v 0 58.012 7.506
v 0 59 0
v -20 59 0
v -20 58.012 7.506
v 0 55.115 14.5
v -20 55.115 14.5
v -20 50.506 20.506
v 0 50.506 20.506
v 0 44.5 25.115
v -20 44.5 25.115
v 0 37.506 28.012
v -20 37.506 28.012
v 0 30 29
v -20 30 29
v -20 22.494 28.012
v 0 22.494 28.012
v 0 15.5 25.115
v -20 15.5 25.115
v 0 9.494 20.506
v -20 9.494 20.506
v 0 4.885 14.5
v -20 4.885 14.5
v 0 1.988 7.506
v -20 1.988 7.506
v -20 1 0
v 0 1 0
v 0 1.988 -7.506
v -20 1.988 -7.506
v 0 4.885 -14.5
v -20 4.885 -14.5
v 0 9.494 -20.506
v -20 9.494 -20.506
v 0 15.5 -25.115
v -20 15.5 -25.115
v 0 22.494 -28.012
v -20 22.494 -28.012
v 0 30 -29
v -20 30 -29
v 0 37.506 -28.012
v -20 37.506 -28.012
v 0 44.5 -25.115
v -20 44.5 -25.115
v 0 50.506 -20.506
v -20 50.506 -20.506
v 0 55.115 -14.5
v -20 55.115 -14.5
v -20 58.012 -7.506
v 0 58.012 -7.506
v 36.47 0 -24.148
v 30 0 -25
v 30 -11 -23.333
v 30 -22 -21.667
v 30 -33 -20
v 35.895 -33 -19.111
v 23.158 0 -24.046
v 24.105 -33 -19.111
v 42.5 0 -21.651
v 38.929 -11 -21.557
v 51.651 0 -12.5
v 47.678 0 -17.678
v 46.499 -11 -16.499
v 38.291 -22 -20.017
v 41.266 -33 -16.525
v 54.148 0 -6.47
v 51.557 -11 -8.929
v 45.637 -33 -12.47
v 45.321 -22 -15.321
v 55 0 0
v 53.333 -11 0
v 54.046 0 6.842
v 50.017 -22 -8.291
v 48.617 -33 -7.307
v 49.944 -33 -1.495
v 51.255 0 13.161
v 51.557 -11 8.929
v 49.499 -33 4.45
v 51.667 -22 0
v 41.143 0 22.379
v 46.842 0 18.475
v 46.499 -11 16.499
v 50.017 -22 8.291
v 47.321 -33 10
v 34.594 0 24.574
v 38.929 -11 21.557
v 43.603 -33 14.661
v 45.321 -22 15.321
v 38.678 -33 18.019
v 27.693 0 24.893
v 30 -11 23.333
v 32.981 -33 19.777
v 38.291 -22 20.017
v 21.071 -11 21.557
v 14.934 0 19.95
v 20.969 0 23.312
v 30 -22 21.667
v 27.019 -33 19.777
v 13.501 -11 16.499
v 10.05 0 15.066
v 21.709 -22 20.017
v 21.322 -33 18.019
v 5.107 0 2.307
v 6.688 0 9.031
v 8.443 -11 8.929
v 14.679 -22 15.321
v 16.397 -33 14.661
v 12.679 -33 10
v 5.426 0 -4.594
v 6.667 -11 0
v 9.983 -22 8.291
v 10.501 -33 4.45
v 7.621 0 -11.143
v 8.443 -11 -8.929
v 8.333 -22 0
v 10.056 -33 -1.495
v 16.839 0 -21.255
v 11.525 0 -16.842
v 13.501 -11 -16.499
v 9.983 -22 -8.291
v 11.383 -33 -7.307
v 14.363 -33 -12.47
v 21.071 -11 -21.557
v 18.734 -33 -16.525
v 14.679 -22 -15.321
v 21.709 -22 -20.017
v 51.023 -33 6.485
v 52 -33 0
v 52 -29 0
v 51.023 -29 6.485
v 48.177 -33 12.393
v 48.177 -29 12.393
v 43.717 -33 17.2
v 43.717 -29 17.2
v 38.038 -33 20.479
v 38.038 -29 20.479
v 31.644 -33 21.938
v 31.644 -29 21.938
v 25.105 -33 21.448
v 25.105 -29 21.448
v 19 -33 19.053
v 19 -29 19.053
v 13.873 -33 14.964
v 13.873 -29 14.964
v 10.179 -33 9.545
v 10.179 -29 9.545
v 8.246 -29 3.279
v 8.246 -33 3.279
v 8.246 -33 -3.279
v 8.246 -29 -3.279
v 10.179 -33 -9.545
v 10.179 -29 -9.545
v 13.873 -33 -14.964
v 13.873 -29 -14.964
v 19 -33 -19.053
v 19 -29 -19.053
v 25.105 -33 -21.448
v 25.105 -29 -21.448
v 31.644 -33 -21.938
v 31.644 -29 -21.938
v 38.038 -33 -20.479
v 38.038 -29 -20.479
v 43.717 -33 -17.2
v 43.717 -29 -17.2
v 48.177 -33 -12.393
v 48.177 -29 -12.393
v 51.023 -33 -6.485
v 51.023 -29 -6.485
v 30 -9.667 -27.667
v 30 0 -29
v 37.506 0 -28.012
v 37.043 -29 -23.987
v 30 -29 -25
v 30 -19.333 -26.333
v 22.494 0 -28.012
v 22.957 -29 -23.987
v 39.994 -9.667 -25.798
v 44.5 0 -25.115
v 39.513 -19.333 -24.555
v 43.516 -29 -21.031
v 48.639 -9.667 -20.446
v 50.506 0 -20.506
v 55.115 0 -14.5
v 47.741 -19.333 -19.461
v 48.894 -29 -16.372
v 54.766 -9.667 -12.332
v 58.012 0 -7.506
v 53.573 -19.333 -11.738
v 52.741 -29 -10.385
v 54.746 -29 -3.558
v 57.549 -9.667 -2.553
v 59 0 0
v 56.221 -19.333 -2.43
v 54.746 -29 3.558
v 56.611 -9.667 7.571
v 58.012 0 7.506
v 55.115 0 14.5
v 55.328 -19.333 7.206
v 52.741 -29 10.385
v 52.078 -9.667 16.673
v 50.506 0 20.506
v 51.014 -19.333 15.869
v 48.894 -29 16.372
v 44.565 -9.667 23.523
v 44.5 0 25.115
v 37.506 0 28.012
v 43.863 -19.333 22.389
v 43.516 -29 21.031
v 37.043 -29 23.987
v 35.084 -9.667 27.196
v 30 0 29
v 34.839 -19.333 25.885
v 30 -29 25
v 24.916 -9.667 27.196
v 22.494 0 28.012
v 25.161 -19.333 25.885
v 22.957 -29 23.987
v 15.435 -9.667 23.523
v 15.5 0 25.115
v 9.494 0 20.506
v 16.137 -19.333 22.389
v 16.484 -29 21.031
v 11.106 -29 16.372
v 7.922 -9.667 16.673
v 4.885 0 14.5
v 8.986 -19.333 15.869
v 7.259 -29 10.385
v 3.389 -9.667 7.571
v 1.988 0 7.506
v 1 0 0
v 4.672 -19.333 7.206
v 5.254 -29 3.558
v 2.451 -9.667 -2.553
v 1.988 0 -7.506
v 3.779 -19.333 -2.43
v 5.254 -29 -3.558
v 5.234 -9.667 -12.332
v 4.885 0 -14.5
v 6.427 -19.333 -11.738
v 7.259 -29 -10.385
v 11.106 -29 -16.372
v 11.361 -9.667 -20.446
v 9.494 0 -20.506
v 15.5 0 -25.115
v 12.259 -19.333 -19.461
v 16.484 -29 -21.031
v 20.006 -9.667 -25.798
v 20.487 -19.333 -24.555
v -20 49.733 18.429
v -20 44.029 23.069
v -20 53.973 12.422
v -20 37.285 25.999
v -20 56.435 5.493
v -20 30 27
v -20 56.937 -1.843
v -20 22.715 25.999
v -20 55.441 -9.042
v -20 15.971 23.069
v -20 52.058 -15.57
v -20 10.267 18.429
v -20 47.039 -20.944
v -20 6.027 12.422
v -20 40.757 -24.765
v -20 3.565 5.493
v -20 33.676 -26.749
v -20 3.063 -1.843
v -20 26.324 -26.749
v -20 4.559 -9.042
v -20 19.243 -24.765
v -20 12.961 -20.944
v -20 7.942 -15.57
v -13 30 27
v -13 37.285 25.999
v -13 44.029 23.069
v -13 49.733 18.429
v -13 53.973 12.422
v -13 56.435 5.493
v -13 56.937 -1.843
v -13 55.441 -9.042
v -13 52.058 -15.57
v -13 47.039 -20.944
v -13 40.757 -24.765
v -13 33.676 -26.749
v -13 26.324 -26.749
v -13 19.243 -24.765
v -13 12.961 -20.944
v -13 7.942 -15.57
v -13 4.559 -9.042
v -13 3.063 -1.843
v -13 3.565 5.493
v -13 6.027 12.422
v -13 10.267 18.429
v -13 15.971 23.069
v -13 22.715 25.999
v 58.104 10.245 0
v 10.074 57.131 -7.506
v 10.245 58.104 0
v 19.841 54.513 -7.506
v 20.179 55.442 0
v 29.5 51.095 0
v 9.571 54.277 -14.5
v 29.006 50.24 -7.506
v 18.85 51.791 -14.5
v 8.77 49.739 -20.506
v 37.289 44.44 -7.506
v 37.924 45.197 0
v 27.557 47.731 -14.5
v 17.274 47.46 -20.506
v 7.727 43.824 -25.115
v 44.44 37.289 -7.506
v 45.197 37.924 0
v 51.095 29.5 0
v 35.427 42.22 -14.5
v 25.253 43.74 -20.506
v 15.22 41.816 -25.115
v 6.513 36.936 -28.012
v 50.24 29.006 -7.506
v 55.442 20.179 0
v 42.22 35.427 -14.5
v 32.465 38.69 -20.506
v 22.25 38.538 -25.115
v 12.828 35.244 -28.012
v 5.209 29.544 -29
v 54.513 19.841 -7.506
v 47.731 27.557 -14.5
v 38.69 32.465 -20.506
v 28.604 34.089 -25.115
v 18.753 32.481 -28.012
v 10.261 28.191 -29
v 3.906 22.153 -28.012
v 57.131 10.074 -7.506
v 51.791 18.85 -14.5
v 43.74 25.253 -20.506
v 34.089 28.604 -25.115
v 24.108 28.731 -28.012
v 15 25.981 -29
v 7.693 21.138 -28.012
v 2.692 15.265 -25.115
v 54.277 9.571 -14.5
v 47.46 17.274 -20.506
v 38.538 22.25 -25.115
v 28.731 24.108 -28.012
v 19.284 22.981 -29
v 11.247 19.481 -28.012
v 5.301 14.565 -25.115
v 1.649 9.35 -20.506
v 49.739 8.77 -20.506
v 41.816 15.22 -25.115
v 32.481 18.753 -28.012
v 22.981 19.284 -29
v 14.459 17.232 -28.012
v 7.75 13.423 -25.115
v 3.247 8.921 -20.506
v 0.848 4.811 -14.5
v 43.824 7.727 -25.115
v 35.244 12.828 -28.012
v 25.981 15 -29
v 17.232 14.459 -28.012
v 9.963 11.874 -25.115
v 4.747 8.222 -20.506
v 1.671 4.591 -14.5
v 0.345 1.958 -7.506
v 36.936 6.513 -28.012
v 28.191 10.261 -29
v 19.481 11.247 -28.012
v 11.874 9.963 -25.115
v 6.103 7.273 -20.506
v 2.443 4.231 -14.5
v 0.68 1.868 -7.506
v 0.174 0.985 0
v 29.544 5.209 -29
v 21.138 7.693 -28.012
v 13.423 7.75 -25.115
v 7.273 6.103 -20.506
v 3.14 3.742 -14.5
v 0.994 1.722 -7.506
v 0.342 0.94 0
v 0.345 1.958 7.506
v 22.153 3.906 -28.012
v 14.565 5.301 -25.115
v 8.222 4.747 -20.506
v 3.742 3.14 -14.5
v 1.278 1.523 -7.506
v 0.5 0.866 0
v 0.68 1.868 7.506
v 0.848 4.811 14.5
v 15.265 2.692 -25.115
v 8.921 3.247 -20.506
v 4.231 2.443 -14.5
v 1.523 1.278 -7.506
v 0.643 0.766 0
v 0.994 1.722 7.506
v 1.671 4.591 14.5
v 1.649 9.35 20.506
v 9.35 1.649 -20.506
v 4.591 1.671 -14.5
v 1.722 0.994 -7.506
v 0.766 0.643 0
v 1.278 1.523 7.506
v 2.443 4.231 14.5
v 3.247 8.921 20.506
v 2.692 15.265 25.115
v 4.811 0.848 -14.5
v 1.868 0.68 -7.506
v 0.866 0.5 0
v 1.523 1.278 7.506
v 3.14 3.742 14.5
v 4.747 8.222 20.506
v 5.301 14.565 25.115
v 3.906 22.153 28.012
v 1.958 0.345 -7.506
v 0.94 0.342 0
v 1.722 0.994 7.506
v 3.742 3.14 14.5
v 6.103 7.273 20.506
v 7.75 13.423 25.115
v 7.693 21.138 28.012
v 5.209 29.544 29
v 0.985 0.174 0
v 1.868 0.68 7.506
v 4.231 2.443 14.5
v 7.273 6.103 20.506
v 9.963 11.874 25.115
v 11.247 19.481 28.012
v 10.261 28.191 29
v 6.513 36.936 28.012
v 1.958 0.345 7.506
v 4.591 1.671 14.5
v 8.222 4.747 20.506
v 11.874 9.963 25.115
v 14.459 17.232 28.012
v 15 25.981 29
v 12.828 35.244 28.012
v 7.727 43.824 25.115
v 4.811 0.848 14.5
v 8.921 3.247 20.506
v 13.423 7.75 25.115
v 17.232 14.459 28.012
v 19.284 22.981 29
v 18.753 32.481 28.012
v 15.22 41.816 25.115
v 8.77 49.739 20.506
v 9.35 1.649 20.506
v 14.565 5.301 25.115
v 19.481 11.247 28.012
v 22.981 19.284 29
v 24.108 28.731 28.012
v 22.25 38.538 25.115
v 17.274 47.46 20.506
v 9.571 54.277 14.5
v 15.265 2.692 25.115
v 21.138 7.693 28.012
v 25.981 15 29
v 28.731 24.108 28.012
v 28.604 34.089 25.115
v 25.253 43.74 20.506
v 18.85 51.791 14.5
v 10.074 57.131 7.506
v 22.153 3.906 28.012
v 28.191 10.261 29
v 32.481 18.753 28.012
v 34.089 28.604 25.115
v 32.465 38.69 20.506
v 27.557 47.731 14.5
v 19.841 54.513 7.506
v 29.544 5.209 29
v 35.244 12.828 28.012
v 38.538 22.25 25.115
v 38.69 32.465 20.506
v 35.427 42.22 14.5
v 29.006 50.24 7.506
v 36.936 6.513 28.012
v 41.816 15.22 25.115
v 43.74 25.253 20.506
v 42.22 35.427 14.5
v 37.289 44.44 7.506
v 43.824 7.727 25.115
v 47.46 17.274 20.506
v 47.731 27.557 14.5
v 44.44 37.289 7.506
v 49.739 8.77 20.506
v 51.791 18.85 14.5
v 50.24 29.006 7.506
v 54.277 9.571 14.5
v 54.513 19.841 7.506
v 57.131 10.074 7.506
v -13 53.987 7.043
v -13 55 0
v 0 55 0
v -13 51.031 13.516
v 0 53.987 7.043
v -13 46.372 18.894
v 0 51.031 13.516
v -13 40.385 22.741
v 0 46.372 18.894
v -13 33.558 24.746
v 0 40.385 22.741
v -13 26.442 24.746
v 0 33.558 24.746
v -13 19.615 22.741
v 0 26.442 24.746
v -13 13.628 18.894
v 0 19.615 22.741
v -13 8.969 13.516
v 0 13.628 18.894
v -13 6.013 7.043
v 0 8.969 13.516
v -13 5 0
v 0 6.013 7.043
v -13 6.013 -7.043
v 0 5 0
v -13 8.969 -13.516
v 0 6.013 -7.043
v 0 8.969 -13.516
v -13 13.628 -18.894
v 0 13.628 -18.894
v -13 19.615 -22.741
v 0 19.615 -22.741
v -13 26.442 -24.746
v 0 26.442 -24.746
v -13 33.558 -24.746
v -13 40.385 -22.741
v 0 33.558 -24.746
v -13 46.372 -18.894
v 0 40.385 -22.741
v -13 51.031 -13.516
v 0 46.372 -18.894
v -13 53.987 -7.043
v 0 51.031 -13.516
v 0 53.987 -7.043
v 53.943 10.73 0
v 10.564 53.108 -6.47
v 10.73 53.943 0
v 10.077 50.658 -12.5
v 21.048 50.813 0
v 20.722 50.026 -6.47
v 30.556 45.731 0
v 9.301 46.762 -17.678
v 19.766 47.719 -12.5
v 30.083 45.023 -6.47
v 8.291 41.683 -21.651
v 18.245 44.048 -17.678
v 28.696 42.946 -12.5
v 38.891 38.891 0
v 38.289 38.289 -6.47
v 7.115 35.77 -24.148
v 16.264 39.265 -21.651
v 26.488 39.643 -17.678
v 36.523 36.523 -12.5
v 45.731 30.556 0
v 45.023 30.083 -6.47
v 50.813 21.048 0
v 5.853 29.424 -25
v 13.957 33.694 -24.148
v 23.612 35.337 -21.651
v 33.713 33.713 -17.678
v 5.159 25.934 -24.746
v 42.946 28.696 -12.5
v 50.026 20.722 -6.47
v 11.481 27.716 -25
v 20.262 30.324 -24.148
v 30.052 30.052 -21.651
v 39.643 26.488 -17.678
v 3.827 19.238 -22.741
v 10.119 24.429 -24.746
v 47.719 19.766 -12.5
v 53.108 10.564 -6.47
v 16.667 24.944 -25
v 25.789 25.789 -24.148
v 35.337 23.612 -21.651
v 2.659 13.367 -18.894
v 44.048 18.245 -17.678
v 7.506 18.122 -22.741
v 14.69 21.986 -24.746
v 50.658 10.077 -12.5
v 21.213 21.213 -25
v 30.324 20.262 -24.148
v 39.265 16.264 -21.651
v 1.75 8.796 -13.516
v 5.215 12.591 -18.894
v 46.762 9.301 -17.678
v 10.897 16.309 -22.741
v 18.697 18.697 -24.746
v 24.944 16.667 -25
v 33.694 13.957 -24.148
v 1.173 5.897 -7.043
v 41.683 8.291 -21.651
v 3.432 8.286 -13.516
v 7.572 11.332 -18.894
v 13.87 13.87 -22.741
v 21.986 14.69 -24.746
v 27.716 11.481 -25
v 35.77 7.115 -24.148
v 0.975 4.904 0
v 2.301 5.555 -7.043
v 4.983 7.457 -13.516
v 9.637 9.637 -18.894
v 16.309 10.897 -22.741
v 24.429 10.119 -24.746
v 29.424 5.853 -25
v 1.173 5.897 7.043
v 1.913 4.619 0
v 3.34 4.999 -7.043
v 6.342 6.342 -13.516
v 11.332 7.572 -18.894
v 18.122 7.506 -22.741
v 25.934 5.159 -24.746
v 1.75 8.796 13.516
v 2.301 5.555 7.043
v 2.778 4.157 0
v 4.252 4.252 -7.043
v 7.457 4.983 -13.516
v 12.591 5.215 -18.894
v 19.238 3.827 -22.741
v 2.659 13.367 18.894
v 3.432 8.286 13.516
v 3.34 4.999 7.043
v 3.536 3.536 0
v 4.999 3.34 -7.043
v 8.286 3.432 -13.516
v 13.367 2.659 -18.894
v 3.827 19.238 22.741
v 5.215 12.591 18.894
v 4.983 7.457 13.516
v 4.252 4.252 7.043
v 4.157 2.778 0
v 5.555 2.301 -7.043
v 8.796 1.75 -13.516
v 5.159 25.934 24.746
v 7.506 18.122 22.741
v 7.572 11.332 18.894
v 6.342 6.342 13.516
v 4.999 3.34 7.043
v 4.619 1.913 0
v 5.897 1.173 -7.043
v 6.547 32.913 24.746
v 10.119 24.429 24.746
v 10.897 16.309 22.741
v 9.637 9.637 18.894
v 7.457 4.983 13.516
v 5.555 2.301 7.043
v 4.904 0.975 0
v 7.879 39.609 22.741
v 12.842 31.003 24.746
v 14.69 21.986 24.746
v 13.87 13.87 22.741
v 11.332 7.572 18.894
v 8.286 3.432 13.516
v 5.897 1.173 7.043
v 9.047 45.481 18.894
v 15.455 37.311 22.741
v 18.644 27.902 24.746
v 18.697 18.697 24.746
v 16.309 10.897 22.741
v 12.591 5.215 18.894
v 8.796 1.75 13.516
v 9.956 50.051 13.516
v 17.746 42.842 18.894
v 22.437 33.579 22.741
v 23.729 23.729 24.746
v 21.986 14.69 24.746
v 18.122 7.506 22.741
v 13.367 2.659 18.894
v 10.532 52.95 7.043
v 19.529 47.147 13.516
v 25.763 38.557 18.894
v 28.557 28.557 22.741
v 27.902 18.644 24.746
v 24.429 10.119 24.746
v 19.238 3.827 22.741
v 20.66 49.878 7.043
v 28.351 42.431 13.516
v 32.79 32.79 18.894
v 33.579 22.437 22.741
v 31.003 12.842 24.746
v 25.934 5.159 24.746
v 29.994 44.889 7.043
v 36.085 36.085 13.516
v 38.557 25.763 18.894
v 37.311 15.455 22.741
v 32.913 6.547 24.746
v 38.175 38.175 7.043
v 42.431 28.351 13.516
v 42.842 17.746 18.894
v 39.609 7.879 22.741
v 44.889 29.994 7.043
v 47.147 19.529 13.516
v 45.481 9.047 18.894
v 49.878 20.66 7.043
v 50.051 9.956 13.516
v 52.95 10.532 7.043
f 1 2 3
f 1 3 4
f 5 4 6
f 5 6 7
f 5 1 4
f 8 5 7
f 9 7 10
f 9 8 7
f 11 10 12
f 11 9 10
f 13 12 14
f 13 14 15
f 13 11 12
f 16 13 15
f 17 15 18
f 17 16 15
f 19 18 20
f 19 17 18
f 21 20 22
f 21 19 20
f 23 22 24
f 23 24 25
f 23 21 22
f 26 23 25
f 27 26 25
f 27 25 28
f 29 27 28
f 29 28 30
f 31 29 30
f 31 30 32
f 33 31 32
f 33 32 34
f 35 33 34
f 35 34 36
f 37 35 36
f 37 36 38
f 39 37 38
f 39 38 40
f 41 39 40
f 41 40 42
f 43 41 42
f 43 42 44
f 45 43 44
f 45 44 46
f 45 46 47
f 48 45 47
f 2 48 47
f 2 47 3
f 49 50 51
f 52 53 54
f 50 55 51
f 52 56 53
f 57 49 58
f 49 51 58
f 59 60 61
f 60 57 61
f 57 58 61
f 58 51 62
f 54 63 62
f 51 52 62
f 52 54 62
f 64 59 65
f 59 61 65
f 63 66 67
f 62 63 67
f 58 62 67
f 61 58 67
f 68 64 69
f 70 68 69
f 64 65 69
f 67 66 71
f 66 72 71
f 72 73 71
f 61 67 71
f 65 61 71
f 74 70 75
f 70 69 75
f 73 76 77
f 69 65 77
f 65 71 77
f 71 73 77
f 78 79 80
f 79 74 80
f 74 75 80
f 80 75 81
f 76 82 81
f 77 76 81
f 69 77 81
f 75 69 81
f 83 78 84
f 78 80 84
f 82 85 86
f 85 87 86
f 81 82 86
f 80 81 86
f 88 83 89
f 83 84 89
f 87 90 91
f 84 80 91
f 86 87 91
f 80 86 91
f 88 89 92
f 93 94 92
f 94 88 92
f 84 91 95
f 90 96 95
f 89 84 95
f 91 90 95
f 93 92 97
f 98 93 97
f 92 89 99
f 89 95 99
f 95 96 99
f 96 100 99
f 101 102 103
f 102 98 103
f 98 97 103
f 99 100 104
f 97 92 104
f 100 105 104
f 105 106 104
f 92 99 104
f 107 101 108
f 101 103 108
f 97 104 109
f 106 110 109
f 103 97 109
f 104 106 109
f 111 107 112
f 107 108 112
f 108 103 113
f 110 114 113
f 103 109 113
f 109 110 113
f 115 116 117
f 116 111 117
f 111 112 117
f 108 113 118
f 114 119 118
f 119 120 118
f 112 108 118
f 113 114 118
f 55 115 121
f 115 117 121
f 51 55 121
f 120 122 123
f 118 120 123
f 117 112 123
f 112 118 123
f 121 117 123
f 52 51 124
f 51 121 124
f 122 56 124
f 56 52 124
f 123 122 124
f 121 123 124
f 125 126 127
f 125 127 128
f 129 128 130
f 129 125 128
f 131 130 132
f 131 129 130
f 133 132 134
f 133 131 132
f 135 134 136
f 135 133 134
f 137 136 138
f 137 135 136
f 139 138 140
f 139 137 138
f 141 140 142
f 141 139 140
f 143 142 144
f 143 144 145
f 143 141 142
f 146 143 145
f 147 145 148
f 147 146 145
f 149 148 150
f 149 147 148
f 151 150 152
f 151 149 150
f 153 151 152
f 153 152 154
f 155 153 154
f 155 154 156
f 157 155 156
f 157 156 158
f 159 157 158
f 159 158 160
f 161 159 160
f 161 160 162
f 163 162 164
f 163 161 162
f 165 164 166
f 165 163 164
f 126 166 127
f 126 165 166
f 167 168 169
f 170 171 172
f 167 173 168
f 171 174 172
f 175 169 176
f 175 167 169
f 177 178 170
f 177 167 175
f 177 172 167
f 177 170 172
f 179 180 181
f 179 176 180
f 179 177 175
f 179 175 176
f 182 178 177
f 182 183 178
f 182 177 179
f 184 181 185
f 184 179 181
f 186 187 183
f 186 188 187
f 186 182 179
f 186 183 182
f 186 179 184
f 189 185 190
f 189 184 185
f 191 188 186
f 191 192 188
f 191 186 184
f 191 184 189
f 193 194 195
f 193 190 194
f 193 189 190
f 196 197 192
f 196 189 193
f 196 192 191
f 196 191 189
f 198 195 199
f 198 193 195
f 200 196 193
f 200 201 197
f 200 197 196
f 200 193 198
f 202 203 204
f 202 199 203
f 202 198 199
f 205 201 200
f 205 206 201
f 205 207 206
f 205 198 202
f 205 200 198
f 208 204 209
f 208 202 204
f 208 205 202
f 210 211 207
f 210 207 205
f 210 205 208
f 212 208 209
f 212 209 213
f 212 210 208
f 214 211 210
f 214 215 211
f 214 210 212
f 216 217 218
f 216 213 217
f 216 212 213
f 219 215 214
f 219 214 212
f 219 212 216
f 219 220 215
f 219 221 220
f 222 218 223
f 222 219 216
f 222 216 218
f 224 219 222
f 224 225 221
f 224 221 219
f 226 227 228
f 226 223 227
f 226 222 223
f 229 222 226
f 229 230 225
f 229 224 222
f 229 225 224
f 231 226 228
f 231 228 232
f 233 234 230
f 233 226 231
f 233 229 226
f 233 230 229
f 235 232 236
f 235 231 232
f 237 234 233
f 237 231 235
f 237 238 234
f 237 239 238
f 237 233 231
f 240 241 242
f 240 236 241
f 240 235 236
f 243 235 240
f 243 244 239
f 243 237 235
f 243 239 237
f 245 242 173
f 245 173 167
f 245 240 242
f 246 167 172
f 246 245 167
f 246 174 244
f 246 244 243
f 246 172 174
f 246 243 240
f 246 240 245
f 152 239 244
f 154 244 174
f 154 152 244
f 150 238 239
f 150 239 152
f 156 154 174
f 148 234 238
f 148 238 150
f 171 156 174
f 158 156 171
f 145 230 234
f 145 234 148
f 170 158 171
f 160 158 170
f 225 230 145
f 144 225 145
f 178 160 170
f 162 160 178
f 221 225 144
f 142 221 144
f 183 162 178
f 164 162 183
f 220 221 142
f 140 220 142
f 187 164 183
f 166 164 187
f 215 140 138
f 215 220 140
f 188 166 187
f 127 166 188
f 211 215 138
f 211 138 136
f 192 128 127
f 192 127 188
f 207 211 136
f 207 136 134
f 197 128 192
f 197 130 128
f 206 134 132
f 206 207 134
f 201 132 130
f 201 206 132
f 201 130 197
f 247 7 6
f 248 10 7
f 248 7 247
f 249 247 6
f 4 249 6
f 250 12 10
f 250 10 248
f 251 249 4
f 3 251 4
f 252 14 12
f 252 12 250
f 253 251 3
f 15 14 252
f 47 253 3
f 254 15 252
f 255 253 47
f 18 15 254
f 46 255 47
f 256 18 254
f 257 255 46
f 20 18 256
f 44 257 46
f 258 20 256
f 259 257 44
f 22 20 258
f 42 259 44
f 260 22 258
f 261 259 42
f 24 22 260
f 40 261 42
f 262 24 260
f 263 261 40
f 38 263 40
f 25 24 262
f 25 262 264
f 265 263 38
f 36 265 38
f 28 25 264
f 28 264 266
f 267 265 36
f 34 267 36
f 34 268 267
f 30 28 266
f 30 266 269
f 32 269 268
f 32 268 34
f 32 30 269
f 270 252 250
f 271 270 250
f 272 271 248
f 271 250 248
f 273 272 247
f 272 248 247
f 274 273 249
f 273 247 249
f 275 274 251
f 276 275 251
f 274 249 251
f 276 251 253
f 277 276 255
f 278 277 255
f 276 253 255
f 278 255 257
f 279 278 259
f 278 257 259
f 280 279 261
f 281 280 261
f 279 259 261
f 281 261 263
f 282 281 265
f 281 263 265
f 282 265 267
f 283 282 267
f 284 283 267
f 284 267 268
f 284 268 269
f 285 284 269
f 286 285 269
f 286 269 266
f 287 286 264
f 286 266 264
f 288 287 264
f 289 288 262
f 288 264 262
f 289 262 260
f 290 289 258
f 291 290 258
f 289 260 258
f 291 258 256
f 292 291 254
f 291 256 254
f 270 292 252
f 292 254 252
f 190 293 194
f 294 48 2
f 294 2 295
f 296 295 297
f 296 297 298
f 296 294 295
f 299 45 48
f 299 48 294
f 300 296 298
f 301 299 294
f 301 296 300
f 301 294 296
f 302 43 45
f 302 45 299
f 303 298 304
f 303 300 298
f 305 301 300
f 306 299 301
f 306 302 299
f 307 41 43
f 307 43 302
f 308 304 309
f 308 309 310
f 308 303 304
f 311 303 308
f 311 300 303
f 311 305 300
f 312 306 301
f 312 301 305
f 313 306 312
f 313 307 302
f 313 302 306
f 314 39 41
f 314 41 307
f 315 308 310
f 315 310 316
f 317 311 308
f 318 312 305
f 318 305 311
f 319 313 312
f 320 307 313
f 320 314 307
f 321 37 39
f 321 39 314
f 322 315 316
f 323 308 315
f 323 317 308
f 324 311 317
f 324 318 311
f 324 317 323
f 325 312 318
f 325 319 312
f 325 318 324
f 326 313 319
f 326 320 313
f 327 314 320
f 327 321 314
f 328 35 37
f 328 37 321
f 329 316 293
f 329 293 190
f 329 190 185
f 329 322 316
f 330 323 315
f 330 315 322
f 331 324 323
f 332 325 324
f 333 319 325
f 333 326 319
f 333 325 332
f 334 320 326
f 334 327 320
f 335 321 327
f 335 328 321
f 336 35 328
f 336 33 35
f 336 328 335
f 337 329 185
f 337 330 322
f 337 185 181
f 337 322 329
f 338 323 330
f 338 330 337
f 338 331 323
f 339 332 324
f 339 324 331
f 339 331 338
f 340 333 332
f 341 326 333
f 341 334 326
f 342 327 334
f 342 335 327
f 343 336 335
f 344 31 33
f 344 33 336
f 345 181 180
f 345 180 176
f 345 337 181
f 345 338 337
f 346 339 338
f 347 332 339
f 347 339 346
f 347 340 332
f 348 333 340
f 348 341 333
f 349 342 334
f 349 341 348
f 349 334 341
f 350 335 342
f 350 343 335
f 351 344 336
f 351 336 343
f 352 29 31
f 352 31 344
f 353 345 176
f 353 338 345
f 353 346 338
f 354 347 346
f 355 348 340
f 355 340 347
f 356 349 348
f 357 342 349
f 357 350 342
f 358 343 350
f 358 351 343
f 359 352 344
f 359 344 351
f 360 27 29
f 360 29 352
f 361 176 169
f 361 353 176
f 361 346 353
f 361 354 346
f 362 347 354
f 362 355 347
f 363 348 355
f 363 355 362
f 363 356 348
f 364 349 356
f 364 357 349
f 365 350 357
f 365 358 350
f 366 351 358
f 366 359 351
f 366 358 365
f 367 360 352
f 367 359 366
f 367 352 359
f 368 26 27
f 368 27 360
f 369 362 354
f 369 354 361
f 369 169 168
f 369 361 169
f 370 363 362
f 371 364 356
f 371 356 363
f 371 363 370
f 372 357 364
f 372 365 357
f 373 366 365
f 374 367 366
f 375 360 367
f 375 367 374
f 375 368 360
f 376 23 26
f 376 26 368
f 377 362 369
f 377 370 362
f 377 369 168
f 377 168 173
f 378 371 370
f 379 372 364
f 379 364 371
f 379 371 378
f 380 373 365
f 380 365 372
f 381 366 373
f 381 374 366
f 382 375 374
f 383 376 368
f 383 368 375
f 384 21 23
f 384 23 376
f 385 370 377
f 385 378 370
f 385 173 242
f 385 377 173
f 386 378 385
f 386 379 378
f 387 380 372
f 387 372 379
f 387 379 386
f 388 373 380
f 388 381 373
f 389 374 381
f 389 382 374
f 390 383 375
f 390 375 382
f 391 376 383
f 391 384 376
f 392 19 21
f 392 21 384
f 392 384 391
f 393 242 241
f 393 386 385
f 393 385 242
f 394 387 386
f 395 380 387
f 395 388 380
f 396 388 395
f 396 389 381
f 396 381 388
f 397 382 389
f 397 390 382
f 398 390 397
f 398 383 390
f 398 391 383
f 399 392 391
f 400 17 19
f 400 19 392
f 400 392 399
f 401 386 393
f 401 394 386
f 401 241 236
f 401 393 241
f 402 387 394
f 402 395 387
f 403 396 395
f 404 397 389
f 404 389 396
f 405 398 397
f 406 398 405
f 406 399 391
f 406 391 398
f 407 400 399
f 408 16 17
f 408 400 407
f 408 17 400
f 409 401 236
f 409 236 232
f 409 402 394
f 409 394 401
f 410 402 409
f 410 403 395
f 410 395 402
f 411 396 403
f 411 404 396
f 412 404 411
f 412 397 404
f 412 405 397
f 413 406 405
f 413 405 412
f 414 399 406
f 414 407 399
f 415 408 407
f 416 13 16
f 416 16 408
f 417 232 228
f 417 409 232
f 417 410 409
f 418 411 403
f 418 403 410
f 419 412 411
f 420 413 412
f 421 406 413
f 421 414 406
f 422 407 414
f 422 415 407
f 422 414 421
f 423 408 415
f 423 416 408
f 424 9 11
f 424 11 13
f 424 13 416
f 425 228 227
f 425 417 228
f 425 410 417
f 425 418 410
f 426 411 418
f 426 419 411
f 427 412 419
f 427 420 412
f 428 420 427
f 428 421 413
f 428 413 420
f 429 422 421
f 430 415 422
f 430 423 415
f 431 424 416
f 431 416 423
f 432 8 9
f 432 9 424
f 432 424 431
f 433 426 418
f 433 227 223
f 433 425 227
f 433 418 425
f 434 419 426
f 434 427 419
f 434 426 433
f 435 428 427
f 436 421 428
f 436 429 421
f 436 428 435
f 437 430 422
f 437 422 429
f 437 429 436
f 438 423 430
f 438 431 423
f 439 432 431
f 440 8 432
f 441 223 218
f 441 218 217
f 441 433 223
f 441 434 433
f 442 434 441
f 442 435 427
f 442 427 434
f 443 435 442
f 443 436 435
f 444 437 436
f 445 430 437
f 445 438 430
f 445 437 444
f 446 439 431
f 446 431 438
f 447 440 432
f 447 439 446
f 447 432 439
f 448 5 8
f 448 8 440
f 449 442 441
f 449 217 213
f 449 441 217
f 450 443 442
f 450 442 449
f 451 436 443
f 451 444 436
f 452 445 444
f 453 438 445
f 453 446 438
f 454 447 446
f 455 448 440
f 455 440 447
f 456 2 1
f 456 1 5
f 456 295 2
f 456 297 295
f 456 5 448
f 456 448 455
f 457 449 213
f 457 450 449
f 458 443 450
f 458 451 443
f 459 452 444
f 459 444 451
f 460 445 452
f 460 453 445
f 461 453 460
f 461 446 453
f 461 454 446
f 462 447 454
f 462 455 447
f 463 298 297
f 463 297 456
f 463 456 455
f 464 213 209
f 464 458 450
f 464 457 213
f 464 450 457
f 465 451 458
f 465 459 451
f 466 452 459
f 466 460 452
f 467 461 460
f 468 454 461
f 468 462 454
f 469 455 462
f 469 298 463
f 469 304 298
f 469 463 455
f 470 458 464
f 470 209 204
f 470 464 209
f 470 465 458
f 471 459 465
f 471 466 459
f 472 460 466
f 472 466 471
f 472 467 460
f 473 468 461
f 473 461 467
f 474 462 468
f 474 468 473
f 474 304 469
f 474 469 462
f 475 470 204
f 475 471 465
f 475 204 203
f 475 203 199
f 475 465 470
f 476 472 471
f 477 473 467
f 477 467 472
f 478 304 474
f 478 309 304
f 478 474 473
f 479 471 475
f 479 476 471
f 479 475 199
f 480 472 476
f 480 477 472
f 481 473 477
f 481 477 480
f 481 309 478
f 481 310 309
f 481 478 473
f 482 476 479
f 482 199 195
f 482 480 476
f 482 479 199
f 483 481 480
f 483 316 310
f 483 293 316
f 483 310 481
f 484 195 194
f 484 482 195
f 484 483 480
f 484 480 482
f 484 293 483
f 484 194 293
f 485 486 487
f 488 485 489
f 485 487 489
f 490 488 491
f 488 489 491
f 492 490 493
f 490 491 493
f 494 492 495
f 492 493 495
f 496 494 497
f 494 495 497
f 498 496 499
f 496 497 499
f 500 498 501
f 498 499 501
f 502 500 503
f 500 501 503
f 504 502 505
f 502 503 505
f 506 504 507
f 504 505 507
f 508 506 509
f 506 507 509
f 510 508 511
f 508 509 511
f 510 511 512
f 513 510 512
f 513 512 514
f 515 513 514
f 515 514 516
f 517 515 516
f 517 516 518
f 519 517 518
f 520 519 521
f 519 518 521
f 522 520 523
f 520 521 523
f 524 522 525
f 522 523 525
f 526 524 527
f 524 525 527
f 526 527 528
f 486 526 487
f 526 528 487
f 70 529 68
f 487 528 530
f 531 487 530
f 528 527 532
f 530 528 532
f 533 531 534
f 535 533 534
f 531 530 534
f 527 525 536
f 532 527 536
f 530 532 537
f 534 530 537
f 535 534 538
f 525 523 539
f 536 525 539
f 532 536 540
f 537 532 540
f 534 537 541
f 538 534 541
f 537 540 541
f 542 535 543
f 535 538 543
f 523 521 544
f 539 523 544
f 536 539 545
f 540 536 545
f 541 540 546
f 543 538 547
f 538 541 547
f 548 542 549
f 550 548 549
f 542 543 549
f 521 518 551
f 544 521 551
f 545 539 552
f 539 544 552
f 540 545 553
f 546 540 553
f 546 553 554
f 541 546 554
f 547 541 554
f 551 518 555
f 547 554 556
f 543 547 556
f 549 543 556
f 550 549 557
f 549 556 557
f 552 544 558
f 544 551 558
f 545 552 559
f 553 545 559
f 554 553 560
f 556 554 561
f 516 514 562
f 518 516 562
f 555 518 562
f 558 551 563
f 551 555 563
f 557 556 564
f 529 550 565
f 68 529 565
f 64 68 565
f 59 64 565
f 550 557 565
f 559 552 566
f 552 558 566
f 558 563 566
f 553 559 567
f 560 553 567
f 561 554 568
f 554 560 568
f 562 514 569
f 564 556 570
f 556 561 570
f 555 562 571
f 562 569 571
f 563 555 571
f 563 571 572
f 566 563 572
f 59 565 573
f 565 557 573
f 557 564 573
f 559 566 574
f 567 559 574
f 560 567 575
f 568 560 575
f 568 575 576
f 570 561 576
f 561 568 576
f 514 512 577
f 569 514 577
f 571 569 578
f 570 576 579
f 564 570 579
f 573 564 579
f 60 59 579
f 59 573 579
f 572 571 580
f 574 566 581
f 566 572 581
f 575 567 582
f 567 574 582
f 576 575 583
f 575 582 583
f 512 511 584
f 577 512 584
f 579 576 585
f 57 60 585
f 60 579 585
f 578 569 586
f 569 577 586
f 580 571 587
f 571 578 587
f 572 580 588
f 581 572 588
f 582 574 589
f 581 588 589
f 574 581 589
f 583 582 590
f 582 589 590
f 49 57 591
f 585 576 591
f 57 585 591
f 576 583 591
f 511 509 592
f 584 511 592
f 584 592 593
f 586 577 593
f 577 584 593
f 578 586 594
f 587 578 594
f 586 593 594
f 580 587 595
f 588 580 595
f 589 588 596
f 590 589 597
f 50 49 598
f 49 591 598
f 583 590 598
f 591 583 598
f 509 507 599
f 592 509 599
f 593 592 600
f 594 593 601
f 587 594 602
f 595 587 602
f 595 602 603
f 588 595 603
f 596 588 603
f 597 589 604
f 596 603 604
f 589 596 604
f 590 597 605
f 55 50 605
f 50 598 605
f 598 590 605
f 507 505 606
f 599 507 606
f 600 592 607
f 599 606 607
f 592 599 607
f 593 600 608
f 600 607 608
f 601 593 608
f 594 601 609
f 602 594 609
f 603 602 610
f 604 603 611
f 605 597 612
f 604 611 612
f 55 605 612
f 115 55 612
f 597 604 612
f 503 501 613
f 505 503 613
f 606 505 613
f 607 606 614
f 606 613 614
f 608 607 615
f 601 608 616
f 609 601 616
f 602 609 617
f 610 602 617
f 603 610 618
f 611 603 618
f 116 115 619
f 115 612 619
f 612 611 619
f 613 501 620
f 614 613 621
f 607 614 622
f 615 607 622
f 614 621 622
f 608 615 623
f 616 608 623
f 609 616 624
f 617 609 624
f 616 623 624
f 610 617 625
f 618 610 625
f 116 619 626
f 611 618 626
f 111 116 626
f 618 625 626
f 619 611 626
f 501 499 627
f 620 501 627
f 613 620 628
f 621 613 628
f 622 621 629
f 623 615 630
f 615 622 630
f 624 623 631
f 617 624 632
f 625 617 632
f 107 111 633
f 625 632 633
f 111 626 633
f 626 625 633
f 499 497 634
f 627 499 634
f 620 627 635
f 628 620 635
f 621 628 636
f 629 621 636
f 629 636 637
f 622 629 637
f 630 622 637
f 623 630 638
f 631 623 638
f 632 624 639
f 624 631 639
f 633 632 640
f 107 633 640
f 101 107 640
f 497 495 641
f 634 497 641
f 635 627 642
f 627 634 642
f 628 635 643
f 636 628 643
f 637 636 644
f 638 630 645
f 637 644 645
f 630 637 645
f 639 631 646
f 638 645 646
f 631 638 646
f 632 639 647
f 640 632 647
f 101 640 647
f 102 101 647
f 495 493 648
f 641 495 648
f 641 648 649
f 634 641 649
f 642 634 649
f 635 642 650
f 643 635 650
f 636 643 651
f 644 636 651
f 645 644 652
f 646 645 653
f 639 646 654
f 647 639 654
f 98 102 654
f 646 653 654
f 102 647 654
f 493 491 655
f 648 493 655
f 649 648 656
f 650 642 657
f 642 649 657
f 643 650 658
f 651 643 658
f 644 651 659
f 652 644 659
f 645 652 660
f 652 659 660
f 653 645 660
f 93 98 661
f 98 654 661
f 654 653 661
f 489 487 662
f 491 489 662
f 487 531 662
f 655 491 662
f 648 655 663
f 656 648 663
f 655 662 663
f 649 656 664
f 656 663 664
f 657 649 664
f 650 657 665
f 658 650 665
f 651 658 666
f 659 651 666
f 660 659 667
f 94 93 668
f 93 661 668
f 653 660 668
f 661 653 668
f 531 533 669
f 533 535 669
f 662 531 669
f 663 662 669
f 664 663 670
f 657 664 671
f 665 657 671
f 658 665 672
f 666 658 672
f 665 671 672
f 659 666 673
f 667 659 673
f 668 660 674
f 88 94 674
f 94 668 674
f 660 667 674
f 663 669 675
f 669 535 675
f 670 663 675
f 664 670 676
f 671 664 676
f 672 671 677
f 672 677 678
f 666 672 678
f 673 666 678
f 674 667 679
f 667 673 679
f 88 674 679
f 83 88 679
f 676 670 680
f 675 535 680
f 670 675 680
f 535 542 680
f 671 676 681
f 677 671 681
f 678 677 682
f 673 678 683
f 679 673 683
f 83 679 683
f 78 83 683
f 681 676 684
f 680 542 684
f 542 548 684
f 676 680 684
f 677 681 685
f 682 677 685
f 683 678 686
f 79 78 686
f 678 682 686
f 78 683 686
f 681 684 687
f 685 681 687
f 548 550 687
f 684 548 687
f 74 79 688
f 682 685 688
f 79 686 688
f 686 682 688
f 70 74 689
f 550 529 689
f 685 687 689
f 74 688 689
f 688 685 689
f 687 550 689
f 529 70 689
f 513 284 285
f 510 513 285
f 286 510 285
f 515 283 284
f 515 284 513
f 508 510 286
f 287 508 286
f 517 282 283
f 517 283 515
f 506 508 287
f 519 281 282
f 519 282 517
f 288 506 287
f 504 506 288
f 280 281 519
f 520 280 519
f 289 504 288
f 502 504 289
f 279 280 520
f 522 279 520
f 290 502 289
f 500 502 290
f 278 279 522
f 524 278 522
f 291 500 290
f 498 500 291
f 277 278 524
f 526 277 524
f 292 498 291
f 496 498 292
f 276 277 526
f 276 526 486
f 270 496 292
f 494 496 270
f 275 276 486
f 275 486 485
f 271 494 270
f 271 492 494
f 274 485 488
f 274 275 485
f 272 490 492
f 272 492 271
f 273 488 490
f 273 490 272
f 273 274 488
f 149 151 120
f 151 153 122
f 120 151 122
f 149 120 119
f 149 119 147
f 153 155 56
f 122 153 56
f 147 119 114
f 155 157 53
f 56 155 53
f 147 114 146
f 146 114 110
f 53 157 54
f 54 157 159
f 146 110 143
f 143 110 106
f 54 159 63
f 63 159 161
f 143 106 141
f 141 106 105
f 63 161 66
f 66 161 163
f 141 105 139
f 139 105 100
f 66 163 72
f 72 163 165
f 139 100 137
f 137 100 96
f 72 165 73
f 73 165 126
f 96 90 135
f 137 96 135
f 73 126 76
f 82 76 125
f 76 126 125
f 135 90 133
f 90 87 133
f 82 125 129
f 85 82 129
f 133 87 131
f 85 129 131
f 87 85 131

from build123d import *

# Parameters (mm, degrees)
SKETCH2_R          = 29
SKETCH2_R_2        = 25
SKETCH3_R          = 27
SKETCH3_R_2        = 25
CUT_EXTRUDE1_DEPTH = 7
SKETCH8_R          = 29
SKETCH8_R_2        = 22
CUT_EXTRUDE3_DEPTH = 4


with BuildPart() as part:
    # Sweep1: sweep along a path in Sketch1
    with BuildLine(Plane.XY) as sweep1_path:
        Line((-20, 30), (0, 30))
        ThreePointArc((0, 30), (21.213203436, 21.213203436), (30, 0))
        Line((30, 0), (30, -33))
    # Sketch2 → Sweep1 (sweep)
    with BuildSketch(Plane(origin=(0, -33, 0), x_dir=(1, 0, 0), z_dir=(0, 1, 0))):
        with Locations((30, 0)):
            Circle(SKETCH2_R)
        with Locations((30, 0)):
            Circle(SKETCH2_R_2, mode=Mode.SUBTRACT)
    sweep(path=sweep1_path.line)

    # Sketch3 → Cut-Extrude1 (cut)
    with BuildSketch(Plane.ZY.offset(20)):
        with Locations((0, 30)):
            Circle(SKETCH3_R)
        with Locations((0, 30)):
            Circle(SKETCH3_R_2, mode=Mode.SUBTRACT)
    extrude(amount=-CUT_EXTRUDE1_DEPTH, mode=Mode.SUBTRACT)

    # Sketch7 → Revolve2 (revolve)
    with BuildSketch(Plane(origin=(30, 0, 0), x_dir=(0, 0, -1), z_dir=(1, 0, 0))):
        Polygon((25, 0), (20, -33), (25, -33), align=None)
    revolve(axis=Axis((30, 0, 0), (0, -1, 0)))

    # Sketch8 → Cut-Extrude3 (cut)
    with BuildSketch(Plane.XZ.offset(33)):
        with Locations((30, 0)):
            Circle(SKETCH8_R)
        with Locations((30, 0)):
            Circle(SKETCH8_R_2, mode=Mode.SUBTRACT)
    extrude(amount=-CUT_EXTRUDE3_DEPTH, mode=Mode.SUBTRACT)

    # Sketch10 → Cut-Revolve2 (revolve, cut)
    with BuildSketch(Plane(origin=(30, 0, 0), x_dir=(0, 0, -1), z_dir=(1, 0, 0))):
        Polygon((29, 0), (25, -29), (29, -29), align=None)
    revolve(axis=Axis((30, 0, 0), (0, -1, 0)), mode=Mode.SUBTRACT)


solid = part.part
